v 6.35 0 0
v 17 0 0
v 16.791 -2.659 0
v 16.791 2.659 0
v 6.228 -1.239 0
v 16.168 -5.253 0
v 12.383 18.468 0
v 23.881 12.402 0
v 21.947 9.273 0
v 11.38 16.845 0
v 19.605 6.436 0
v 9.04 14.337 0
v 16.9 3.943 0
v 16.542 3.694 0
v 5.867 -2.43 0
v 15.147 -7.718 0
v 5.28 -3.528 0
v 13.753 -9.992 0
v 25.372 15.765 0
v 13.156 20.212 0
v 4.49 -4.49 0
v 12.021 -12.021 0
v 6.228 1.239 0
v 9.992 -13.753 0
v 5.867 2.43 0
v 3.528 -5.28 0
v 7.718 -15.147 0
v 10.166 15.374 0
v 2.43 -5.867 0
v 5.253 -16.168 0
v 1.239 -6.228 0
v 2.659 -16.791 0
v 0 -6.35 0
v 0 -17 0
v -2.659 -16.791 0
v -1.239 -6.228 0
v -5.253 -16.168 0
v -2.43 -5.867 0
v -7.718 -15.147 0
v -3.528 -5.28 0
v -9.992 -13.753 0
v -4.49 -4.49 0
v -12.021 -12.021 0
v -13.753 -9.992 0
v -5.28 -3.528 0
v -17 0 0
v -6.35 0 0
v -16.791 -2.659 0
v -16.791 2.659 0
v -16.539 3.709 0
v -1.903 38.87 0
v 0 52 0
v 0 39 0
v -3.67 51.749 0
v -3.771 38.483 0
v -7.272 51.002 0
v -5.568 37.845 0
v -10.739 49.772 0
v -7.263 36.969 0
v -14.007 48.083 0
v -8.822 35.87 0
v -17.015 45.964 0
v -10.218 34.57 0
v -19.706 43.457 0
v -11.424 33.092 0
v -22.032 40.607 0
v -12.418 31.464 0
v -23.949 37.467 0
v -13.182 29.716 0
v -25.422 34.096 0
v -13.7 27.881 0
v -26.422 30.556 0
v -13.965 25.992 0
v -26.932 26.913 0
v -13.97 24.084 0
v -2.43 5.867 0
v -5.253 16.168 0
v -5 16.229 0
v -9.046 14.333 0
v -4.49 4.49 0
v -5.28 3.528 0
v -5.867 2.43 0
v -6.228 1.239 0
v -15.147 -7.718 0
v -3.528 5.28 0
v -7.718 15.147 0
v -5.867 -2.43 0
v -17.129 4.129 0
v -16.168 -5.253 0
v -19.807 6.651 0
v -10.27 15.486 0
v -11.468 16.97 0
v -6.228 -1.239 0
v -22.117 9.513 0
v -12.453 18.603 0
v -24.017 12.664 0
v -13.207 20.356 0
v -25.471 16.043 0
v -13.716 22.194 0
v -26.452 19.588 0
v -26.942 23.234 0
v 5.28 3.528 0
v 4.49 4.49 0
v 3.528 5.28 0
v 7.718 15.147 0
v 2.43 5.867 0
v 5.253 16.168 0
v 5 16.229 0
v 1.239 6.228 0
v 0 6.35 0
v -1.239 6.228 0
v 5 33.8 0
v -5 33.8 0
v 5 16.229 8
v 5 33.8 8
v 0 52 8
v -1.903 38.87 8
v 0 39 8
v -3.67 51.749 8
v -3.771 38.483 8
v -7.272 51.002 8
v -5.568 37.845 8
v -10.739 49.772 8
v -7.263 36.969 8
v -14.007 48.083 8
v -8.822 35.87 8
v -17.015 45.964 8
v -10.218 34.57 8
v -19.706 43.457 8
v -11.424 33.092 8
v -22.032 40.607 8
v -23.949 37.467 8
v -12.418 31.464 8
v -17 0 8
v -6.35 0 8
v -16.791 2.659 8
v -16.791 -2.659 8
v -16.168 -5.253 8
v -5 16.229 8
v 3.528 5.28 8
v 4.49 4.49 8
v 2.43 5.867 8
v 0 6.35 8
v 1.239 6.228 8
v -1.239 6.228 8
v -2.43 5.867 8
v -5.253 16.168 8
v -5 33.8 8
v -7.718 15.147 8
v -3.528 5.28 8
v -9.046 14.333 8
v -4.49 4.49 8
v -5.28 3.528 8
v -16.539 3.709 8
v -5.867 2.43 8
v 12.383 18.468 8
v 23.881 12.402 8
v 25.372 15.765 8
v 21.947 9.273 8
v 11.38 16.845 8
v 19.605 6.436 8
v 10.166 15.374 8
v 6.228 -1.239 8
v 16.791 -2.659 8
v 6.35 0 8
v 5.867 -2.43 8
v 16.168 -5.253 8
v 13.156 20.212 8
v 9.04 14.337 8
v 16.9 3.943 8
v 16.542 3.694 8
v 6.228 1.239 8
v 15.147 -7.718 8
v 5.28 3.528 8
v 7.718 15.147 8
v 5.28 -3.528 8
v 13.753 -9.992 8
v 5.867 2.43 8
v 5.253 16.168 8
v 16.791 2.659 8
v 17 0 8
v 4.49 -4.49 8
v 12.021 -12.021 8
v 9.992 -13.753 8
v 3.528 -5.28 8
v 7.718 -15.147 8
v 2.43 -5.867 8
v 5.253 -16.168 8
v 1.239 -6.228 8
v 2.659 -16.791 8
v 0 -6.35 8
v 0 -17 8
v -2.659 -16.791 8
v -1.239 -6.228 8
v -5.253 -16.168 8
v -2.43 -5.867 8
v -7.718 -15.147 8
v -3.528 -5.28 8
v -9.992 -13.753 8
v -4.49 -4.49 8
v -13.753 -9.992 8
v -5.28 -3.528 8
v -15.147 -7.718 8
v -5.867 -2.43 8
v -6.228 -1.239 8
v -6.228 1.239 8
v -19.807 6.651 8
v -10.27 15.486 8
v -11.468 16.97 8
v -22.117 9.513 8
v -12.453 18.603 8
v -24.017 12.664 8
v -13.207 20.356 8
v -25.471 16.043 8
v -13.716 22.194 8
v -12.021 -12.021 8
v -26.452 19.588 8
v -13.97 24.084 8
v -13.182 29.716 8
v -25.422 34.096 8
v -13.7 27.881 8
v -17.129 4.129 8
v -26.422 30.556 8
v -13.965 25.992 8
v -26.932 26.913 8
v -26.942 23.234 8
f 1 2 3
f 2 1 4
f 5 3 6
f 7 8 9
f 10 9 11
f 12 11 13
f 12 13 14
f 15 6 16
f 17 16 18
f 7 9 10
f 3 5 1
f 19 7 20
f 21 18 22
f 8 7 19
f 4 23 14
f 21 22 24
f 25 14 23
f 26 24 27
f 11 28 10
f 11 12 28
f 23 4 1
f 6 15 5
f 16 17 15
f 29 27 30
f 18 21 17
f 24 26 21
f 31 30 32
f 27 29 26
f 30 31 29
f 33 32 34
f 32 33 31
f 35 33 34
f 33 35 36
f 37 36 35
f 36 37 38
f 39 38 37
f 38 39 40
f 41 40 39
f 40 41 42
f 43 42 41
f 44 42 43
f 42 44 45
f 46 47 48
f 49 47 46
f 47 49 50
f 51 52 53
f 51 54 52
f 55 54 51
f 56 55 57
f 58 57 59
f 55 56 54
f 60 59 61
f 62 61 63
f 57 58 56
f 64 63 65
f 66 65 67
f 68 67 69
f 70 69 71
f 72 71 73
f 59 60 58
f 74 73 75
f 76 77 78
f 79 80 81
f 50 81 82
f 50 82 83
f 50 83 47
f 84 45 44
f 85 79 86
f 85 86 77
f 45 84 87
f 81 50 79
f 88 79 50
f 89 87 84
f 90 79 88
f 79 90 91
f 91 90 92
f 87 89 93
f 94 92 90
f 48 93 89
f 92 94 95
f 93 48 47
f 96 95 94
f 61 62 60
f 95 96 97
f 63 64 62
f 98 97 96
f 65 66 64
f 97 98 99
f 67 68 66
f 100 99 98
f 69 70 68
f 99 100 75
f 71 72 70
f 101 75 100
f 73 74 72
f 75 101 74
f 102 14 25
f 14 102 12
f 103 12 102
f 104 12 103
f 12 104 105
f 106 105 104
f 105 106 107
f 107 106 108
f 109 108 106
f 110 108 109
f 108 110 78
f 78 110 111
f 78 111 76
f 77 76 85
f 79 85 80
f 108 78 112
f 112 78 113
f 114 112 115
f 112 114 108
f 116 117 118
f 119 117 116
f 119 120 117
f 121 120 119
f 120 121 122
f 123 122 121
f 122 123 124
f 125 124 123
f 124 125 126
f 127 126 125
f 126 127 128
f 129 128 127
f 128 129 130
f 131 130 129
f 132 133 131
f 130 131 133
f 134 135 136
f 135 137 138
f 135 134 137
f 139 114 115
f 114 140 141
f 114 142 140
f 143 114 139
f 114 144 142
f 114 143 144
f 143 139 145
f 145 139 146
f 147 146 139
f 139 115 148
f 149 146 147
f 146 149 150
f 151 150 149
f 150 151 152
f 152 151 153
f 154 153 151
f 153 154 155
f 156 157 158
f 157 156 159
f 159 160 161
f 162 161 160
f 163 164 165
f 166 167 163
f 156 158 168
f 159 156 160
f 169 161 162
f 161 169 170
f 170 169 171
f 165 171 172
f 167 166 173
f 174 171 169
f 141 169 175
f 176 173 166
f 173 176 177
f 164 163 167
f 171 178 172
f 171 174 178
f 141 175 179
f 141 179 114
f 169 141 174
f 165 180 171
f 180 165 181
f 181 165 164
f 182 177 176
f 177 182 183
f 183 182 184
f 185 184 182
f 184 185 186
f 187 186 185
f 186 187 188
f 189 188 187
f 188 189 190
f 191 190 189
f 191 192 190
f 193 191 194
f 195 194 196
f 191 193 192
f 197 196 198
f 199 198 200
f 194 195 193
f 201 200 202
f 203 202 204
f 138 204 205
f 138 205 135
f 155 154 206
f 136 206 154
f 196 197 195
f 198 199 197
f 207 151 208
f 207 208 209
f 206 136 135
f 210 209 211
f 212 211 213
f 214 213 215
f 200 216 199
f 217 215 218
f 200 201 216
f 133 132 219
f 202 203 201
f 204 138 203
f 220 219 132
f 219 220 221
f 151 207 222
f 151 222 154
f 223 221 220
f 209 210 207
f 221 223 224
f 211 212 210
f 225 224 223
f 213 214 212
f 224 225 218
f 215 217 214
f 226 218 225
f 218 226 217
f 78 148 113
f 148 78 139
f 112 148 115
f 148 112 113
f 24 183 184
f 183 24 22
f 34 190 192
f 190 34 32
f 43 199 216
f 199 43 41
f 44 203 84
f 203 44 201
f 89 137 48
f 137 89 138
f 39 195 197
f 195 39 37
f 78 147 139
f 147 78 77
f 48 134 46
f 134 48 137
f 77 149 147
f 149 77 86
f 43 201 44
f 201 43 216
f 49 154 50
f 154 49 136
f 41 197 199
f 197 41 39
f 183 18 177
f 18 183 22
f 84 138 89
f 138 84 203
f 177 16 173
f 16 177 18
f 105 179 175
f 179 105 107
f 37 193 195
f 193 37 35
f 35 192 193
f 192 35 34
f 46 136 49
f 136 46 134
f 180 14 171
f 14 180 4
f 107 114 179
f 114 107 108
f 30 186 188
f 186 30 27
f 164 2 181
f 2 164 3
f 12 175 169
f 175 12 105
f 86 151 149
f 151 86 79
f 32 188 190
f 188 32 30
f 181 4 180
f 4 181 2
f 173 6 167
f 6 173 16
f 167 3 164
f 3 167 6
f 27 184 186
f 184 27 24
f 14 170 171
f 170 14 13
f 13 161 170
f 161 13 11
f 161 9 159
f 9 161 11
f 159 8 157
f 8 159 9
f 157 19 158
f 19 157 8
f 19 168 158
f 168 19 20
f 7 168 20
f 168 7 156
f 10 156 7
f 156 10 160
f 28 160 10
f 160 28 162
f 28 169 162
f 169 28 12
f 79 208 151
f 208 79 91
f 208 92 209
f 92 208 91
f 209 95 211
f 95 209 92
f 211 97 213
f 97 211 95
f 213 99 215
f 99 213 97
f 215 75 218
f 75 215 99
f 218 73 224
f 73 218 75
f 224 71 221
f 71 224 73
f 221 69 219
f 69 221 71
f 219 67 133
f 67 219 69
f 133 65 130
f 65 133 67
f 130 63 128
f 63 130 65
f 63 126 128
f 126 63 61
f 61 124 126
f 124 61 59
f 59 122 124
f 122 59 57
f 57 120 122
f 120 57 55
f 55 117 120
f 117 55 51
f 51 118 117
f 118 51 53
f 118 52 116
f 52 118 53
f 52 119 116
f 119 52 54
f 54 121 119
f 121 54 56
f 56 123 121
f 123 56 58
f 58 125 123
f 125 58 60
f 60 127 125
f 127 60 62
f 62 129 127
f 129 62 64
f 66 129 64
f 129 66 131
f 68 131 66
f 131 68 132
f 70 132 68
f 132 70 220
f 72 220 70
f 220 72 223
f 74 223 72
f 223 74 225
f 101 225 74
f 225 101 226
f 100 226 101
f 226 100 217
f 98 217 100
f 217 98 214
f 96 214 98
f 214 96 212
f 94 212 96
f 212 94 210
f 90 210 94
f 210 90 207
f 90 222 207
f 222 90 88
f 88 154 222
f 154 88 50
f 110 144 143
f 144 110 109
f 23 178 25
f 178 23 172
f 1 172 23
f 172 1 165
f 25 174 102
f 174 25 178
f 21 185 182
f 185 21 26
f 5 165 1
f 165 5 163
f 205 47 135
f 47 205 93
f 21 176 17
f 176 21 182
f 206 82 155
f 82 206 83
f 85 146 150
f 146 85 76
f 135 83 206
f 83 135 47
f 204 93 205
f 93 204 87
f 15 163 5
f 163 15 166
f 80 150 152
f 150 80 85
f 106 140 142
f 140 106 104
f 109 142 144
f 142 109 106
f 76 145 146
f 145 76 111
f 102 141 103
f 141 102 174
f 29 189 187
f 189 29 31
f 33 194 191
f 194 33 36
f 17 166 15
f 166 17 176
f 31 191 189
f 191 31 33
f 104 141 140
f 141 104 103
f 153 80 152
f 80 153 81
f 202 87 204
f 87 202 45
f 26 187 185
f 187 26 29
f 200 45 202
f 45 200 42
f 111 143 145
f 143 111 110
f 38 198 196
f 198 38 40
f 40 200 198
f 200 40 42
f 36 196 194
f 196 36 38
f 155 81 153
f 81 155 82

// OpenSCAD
$fn = 32;

// ----------------------------------------------------------------------
// Hook: 50 mm shank into a 14 mm curl, 8 mm thick
// ----------------------------------------------------------------------

// --- parameters (mm) ---
shank_len = 50;           // shank length from the boss centre
shank_w = 10;             // shank width
boss_d = 34;              // boss diameter
bore_d = 12.7;            // boss bore
curl_in = 14;             // curl inner radius
curl_out = 27;            // curl outer radius
curl_sweep = 250;         // curl sweep angle
hook_t = 8;               // hook thickness

shank_profile = [[-5, 33.8], [5, 33.8], [5, 15], [-5, 15]];
boss_profile = [[17, 0], [16.791, 2.659], [16.168, 5.253], [15.147, 7.718], [13.753, 9.992], [12.021, 12.021], [9.992, 13.753], [7.718, 15.147], [5.253, 16.168], [2.659, 16.791], [0, 17], [-2.659, 16.791], [-5.253, 16.168], [-7.718, 15.147], [-9.992, 13.753], [-12.021, 12.021], [-13.753, 9.992], [-15.147, 7.718], [-16.168, 5.253], [-16.791, 2.659], [-17, 0], [-16.791, -2.659], [-16.168, -5.253], [-15.147, -7.718], [-13.753, -9.992], [-12.021, -12.021], [-9.992, -13.753], [-7.718, -15.147], [-5.253, -16.168], [-2.659, -16.791], [0, -17], [2.659, -16.791], [5.253, -16.168], [7.718, -15.147], [9.992, -13.753], [12.021, -12.021], [13.753, -9.992], [15.147, -7.718], [16.168, -5.253], [16.791, -2.659]];
curl_profile = [[0, 52], [-3.67, 51.749], [-7.272, 51.002], [-10.739, 49.772], [-14.007, 48.083], [-17.015, 45.964], [-19.706, 43.457], [-22.032, 40.607], [-23.949, 37.467], [-25.422, 34.096], [-26.422, 30.556], [-26.932, 26.913], [-26.942, 23.234], [-26.452, 19.588], [-25.471, 16.043], [-24.017, 12.664], [-22.117, 9.513], [-19.807, 6.651], [-17.129, 4.129], [-14.133, 1.994], [-10.874, 0.287], [-7.414, -0.962], [-3.816, -1.729], [-0.147, -2], [3.524, -1.769], [7.13, -1.041], [10.604, 0.169], [13.881, 1.841], [16.9, 3.943], [19.605, 6.436], [21.947, 9.273], [23.881, 12.402], [25.372, 15.765], [13.156, 20.212], [12.383, 18.468], [11.38, 16.845], [10.166, 15.374], [8.763, 14.082], [7.197, 12.992], [5.498, 12.125], [3.697, 11.497], [1.827, 11.12], [-0.076, 11], [-1.979, 11.141], [-3.844, 11.538], [-5.638, 12.186], [-7.328, 13.071], [-8.882, 14.178], [-10.27, 15.486], [-11.468, 16.97], [-12.453, 18.603], [-13.207, 20.356], [-13.716, 22.194], [-13.97, 24.084], [-13.965, 25.992], [-13.7, 27.881], [-13.182, 29.716], [-12.418, 31.464], [-11.424, 33.092], [-10.218, 34.57], [-8.822, 35.87], [-7.263, 36.969], [-5.568, 37.845], [-3.771, 38.483], [-1.903, 38.87], [0, 39]];

difference() {
  union() {
    /* three overlapping outlines: shank, boss and the smooth curl */
    linear_extrude(height = hook_t) polygon(shank_profile);
    linear_extrude(height = hook_t) polygon(boss_profile);
    linear_extrude(height = hook_t) polygon(curl_profile);
  }
  translate([0, 0, -2.5]) cylinder(h = hook_t + 5, d = bore_d);
}
